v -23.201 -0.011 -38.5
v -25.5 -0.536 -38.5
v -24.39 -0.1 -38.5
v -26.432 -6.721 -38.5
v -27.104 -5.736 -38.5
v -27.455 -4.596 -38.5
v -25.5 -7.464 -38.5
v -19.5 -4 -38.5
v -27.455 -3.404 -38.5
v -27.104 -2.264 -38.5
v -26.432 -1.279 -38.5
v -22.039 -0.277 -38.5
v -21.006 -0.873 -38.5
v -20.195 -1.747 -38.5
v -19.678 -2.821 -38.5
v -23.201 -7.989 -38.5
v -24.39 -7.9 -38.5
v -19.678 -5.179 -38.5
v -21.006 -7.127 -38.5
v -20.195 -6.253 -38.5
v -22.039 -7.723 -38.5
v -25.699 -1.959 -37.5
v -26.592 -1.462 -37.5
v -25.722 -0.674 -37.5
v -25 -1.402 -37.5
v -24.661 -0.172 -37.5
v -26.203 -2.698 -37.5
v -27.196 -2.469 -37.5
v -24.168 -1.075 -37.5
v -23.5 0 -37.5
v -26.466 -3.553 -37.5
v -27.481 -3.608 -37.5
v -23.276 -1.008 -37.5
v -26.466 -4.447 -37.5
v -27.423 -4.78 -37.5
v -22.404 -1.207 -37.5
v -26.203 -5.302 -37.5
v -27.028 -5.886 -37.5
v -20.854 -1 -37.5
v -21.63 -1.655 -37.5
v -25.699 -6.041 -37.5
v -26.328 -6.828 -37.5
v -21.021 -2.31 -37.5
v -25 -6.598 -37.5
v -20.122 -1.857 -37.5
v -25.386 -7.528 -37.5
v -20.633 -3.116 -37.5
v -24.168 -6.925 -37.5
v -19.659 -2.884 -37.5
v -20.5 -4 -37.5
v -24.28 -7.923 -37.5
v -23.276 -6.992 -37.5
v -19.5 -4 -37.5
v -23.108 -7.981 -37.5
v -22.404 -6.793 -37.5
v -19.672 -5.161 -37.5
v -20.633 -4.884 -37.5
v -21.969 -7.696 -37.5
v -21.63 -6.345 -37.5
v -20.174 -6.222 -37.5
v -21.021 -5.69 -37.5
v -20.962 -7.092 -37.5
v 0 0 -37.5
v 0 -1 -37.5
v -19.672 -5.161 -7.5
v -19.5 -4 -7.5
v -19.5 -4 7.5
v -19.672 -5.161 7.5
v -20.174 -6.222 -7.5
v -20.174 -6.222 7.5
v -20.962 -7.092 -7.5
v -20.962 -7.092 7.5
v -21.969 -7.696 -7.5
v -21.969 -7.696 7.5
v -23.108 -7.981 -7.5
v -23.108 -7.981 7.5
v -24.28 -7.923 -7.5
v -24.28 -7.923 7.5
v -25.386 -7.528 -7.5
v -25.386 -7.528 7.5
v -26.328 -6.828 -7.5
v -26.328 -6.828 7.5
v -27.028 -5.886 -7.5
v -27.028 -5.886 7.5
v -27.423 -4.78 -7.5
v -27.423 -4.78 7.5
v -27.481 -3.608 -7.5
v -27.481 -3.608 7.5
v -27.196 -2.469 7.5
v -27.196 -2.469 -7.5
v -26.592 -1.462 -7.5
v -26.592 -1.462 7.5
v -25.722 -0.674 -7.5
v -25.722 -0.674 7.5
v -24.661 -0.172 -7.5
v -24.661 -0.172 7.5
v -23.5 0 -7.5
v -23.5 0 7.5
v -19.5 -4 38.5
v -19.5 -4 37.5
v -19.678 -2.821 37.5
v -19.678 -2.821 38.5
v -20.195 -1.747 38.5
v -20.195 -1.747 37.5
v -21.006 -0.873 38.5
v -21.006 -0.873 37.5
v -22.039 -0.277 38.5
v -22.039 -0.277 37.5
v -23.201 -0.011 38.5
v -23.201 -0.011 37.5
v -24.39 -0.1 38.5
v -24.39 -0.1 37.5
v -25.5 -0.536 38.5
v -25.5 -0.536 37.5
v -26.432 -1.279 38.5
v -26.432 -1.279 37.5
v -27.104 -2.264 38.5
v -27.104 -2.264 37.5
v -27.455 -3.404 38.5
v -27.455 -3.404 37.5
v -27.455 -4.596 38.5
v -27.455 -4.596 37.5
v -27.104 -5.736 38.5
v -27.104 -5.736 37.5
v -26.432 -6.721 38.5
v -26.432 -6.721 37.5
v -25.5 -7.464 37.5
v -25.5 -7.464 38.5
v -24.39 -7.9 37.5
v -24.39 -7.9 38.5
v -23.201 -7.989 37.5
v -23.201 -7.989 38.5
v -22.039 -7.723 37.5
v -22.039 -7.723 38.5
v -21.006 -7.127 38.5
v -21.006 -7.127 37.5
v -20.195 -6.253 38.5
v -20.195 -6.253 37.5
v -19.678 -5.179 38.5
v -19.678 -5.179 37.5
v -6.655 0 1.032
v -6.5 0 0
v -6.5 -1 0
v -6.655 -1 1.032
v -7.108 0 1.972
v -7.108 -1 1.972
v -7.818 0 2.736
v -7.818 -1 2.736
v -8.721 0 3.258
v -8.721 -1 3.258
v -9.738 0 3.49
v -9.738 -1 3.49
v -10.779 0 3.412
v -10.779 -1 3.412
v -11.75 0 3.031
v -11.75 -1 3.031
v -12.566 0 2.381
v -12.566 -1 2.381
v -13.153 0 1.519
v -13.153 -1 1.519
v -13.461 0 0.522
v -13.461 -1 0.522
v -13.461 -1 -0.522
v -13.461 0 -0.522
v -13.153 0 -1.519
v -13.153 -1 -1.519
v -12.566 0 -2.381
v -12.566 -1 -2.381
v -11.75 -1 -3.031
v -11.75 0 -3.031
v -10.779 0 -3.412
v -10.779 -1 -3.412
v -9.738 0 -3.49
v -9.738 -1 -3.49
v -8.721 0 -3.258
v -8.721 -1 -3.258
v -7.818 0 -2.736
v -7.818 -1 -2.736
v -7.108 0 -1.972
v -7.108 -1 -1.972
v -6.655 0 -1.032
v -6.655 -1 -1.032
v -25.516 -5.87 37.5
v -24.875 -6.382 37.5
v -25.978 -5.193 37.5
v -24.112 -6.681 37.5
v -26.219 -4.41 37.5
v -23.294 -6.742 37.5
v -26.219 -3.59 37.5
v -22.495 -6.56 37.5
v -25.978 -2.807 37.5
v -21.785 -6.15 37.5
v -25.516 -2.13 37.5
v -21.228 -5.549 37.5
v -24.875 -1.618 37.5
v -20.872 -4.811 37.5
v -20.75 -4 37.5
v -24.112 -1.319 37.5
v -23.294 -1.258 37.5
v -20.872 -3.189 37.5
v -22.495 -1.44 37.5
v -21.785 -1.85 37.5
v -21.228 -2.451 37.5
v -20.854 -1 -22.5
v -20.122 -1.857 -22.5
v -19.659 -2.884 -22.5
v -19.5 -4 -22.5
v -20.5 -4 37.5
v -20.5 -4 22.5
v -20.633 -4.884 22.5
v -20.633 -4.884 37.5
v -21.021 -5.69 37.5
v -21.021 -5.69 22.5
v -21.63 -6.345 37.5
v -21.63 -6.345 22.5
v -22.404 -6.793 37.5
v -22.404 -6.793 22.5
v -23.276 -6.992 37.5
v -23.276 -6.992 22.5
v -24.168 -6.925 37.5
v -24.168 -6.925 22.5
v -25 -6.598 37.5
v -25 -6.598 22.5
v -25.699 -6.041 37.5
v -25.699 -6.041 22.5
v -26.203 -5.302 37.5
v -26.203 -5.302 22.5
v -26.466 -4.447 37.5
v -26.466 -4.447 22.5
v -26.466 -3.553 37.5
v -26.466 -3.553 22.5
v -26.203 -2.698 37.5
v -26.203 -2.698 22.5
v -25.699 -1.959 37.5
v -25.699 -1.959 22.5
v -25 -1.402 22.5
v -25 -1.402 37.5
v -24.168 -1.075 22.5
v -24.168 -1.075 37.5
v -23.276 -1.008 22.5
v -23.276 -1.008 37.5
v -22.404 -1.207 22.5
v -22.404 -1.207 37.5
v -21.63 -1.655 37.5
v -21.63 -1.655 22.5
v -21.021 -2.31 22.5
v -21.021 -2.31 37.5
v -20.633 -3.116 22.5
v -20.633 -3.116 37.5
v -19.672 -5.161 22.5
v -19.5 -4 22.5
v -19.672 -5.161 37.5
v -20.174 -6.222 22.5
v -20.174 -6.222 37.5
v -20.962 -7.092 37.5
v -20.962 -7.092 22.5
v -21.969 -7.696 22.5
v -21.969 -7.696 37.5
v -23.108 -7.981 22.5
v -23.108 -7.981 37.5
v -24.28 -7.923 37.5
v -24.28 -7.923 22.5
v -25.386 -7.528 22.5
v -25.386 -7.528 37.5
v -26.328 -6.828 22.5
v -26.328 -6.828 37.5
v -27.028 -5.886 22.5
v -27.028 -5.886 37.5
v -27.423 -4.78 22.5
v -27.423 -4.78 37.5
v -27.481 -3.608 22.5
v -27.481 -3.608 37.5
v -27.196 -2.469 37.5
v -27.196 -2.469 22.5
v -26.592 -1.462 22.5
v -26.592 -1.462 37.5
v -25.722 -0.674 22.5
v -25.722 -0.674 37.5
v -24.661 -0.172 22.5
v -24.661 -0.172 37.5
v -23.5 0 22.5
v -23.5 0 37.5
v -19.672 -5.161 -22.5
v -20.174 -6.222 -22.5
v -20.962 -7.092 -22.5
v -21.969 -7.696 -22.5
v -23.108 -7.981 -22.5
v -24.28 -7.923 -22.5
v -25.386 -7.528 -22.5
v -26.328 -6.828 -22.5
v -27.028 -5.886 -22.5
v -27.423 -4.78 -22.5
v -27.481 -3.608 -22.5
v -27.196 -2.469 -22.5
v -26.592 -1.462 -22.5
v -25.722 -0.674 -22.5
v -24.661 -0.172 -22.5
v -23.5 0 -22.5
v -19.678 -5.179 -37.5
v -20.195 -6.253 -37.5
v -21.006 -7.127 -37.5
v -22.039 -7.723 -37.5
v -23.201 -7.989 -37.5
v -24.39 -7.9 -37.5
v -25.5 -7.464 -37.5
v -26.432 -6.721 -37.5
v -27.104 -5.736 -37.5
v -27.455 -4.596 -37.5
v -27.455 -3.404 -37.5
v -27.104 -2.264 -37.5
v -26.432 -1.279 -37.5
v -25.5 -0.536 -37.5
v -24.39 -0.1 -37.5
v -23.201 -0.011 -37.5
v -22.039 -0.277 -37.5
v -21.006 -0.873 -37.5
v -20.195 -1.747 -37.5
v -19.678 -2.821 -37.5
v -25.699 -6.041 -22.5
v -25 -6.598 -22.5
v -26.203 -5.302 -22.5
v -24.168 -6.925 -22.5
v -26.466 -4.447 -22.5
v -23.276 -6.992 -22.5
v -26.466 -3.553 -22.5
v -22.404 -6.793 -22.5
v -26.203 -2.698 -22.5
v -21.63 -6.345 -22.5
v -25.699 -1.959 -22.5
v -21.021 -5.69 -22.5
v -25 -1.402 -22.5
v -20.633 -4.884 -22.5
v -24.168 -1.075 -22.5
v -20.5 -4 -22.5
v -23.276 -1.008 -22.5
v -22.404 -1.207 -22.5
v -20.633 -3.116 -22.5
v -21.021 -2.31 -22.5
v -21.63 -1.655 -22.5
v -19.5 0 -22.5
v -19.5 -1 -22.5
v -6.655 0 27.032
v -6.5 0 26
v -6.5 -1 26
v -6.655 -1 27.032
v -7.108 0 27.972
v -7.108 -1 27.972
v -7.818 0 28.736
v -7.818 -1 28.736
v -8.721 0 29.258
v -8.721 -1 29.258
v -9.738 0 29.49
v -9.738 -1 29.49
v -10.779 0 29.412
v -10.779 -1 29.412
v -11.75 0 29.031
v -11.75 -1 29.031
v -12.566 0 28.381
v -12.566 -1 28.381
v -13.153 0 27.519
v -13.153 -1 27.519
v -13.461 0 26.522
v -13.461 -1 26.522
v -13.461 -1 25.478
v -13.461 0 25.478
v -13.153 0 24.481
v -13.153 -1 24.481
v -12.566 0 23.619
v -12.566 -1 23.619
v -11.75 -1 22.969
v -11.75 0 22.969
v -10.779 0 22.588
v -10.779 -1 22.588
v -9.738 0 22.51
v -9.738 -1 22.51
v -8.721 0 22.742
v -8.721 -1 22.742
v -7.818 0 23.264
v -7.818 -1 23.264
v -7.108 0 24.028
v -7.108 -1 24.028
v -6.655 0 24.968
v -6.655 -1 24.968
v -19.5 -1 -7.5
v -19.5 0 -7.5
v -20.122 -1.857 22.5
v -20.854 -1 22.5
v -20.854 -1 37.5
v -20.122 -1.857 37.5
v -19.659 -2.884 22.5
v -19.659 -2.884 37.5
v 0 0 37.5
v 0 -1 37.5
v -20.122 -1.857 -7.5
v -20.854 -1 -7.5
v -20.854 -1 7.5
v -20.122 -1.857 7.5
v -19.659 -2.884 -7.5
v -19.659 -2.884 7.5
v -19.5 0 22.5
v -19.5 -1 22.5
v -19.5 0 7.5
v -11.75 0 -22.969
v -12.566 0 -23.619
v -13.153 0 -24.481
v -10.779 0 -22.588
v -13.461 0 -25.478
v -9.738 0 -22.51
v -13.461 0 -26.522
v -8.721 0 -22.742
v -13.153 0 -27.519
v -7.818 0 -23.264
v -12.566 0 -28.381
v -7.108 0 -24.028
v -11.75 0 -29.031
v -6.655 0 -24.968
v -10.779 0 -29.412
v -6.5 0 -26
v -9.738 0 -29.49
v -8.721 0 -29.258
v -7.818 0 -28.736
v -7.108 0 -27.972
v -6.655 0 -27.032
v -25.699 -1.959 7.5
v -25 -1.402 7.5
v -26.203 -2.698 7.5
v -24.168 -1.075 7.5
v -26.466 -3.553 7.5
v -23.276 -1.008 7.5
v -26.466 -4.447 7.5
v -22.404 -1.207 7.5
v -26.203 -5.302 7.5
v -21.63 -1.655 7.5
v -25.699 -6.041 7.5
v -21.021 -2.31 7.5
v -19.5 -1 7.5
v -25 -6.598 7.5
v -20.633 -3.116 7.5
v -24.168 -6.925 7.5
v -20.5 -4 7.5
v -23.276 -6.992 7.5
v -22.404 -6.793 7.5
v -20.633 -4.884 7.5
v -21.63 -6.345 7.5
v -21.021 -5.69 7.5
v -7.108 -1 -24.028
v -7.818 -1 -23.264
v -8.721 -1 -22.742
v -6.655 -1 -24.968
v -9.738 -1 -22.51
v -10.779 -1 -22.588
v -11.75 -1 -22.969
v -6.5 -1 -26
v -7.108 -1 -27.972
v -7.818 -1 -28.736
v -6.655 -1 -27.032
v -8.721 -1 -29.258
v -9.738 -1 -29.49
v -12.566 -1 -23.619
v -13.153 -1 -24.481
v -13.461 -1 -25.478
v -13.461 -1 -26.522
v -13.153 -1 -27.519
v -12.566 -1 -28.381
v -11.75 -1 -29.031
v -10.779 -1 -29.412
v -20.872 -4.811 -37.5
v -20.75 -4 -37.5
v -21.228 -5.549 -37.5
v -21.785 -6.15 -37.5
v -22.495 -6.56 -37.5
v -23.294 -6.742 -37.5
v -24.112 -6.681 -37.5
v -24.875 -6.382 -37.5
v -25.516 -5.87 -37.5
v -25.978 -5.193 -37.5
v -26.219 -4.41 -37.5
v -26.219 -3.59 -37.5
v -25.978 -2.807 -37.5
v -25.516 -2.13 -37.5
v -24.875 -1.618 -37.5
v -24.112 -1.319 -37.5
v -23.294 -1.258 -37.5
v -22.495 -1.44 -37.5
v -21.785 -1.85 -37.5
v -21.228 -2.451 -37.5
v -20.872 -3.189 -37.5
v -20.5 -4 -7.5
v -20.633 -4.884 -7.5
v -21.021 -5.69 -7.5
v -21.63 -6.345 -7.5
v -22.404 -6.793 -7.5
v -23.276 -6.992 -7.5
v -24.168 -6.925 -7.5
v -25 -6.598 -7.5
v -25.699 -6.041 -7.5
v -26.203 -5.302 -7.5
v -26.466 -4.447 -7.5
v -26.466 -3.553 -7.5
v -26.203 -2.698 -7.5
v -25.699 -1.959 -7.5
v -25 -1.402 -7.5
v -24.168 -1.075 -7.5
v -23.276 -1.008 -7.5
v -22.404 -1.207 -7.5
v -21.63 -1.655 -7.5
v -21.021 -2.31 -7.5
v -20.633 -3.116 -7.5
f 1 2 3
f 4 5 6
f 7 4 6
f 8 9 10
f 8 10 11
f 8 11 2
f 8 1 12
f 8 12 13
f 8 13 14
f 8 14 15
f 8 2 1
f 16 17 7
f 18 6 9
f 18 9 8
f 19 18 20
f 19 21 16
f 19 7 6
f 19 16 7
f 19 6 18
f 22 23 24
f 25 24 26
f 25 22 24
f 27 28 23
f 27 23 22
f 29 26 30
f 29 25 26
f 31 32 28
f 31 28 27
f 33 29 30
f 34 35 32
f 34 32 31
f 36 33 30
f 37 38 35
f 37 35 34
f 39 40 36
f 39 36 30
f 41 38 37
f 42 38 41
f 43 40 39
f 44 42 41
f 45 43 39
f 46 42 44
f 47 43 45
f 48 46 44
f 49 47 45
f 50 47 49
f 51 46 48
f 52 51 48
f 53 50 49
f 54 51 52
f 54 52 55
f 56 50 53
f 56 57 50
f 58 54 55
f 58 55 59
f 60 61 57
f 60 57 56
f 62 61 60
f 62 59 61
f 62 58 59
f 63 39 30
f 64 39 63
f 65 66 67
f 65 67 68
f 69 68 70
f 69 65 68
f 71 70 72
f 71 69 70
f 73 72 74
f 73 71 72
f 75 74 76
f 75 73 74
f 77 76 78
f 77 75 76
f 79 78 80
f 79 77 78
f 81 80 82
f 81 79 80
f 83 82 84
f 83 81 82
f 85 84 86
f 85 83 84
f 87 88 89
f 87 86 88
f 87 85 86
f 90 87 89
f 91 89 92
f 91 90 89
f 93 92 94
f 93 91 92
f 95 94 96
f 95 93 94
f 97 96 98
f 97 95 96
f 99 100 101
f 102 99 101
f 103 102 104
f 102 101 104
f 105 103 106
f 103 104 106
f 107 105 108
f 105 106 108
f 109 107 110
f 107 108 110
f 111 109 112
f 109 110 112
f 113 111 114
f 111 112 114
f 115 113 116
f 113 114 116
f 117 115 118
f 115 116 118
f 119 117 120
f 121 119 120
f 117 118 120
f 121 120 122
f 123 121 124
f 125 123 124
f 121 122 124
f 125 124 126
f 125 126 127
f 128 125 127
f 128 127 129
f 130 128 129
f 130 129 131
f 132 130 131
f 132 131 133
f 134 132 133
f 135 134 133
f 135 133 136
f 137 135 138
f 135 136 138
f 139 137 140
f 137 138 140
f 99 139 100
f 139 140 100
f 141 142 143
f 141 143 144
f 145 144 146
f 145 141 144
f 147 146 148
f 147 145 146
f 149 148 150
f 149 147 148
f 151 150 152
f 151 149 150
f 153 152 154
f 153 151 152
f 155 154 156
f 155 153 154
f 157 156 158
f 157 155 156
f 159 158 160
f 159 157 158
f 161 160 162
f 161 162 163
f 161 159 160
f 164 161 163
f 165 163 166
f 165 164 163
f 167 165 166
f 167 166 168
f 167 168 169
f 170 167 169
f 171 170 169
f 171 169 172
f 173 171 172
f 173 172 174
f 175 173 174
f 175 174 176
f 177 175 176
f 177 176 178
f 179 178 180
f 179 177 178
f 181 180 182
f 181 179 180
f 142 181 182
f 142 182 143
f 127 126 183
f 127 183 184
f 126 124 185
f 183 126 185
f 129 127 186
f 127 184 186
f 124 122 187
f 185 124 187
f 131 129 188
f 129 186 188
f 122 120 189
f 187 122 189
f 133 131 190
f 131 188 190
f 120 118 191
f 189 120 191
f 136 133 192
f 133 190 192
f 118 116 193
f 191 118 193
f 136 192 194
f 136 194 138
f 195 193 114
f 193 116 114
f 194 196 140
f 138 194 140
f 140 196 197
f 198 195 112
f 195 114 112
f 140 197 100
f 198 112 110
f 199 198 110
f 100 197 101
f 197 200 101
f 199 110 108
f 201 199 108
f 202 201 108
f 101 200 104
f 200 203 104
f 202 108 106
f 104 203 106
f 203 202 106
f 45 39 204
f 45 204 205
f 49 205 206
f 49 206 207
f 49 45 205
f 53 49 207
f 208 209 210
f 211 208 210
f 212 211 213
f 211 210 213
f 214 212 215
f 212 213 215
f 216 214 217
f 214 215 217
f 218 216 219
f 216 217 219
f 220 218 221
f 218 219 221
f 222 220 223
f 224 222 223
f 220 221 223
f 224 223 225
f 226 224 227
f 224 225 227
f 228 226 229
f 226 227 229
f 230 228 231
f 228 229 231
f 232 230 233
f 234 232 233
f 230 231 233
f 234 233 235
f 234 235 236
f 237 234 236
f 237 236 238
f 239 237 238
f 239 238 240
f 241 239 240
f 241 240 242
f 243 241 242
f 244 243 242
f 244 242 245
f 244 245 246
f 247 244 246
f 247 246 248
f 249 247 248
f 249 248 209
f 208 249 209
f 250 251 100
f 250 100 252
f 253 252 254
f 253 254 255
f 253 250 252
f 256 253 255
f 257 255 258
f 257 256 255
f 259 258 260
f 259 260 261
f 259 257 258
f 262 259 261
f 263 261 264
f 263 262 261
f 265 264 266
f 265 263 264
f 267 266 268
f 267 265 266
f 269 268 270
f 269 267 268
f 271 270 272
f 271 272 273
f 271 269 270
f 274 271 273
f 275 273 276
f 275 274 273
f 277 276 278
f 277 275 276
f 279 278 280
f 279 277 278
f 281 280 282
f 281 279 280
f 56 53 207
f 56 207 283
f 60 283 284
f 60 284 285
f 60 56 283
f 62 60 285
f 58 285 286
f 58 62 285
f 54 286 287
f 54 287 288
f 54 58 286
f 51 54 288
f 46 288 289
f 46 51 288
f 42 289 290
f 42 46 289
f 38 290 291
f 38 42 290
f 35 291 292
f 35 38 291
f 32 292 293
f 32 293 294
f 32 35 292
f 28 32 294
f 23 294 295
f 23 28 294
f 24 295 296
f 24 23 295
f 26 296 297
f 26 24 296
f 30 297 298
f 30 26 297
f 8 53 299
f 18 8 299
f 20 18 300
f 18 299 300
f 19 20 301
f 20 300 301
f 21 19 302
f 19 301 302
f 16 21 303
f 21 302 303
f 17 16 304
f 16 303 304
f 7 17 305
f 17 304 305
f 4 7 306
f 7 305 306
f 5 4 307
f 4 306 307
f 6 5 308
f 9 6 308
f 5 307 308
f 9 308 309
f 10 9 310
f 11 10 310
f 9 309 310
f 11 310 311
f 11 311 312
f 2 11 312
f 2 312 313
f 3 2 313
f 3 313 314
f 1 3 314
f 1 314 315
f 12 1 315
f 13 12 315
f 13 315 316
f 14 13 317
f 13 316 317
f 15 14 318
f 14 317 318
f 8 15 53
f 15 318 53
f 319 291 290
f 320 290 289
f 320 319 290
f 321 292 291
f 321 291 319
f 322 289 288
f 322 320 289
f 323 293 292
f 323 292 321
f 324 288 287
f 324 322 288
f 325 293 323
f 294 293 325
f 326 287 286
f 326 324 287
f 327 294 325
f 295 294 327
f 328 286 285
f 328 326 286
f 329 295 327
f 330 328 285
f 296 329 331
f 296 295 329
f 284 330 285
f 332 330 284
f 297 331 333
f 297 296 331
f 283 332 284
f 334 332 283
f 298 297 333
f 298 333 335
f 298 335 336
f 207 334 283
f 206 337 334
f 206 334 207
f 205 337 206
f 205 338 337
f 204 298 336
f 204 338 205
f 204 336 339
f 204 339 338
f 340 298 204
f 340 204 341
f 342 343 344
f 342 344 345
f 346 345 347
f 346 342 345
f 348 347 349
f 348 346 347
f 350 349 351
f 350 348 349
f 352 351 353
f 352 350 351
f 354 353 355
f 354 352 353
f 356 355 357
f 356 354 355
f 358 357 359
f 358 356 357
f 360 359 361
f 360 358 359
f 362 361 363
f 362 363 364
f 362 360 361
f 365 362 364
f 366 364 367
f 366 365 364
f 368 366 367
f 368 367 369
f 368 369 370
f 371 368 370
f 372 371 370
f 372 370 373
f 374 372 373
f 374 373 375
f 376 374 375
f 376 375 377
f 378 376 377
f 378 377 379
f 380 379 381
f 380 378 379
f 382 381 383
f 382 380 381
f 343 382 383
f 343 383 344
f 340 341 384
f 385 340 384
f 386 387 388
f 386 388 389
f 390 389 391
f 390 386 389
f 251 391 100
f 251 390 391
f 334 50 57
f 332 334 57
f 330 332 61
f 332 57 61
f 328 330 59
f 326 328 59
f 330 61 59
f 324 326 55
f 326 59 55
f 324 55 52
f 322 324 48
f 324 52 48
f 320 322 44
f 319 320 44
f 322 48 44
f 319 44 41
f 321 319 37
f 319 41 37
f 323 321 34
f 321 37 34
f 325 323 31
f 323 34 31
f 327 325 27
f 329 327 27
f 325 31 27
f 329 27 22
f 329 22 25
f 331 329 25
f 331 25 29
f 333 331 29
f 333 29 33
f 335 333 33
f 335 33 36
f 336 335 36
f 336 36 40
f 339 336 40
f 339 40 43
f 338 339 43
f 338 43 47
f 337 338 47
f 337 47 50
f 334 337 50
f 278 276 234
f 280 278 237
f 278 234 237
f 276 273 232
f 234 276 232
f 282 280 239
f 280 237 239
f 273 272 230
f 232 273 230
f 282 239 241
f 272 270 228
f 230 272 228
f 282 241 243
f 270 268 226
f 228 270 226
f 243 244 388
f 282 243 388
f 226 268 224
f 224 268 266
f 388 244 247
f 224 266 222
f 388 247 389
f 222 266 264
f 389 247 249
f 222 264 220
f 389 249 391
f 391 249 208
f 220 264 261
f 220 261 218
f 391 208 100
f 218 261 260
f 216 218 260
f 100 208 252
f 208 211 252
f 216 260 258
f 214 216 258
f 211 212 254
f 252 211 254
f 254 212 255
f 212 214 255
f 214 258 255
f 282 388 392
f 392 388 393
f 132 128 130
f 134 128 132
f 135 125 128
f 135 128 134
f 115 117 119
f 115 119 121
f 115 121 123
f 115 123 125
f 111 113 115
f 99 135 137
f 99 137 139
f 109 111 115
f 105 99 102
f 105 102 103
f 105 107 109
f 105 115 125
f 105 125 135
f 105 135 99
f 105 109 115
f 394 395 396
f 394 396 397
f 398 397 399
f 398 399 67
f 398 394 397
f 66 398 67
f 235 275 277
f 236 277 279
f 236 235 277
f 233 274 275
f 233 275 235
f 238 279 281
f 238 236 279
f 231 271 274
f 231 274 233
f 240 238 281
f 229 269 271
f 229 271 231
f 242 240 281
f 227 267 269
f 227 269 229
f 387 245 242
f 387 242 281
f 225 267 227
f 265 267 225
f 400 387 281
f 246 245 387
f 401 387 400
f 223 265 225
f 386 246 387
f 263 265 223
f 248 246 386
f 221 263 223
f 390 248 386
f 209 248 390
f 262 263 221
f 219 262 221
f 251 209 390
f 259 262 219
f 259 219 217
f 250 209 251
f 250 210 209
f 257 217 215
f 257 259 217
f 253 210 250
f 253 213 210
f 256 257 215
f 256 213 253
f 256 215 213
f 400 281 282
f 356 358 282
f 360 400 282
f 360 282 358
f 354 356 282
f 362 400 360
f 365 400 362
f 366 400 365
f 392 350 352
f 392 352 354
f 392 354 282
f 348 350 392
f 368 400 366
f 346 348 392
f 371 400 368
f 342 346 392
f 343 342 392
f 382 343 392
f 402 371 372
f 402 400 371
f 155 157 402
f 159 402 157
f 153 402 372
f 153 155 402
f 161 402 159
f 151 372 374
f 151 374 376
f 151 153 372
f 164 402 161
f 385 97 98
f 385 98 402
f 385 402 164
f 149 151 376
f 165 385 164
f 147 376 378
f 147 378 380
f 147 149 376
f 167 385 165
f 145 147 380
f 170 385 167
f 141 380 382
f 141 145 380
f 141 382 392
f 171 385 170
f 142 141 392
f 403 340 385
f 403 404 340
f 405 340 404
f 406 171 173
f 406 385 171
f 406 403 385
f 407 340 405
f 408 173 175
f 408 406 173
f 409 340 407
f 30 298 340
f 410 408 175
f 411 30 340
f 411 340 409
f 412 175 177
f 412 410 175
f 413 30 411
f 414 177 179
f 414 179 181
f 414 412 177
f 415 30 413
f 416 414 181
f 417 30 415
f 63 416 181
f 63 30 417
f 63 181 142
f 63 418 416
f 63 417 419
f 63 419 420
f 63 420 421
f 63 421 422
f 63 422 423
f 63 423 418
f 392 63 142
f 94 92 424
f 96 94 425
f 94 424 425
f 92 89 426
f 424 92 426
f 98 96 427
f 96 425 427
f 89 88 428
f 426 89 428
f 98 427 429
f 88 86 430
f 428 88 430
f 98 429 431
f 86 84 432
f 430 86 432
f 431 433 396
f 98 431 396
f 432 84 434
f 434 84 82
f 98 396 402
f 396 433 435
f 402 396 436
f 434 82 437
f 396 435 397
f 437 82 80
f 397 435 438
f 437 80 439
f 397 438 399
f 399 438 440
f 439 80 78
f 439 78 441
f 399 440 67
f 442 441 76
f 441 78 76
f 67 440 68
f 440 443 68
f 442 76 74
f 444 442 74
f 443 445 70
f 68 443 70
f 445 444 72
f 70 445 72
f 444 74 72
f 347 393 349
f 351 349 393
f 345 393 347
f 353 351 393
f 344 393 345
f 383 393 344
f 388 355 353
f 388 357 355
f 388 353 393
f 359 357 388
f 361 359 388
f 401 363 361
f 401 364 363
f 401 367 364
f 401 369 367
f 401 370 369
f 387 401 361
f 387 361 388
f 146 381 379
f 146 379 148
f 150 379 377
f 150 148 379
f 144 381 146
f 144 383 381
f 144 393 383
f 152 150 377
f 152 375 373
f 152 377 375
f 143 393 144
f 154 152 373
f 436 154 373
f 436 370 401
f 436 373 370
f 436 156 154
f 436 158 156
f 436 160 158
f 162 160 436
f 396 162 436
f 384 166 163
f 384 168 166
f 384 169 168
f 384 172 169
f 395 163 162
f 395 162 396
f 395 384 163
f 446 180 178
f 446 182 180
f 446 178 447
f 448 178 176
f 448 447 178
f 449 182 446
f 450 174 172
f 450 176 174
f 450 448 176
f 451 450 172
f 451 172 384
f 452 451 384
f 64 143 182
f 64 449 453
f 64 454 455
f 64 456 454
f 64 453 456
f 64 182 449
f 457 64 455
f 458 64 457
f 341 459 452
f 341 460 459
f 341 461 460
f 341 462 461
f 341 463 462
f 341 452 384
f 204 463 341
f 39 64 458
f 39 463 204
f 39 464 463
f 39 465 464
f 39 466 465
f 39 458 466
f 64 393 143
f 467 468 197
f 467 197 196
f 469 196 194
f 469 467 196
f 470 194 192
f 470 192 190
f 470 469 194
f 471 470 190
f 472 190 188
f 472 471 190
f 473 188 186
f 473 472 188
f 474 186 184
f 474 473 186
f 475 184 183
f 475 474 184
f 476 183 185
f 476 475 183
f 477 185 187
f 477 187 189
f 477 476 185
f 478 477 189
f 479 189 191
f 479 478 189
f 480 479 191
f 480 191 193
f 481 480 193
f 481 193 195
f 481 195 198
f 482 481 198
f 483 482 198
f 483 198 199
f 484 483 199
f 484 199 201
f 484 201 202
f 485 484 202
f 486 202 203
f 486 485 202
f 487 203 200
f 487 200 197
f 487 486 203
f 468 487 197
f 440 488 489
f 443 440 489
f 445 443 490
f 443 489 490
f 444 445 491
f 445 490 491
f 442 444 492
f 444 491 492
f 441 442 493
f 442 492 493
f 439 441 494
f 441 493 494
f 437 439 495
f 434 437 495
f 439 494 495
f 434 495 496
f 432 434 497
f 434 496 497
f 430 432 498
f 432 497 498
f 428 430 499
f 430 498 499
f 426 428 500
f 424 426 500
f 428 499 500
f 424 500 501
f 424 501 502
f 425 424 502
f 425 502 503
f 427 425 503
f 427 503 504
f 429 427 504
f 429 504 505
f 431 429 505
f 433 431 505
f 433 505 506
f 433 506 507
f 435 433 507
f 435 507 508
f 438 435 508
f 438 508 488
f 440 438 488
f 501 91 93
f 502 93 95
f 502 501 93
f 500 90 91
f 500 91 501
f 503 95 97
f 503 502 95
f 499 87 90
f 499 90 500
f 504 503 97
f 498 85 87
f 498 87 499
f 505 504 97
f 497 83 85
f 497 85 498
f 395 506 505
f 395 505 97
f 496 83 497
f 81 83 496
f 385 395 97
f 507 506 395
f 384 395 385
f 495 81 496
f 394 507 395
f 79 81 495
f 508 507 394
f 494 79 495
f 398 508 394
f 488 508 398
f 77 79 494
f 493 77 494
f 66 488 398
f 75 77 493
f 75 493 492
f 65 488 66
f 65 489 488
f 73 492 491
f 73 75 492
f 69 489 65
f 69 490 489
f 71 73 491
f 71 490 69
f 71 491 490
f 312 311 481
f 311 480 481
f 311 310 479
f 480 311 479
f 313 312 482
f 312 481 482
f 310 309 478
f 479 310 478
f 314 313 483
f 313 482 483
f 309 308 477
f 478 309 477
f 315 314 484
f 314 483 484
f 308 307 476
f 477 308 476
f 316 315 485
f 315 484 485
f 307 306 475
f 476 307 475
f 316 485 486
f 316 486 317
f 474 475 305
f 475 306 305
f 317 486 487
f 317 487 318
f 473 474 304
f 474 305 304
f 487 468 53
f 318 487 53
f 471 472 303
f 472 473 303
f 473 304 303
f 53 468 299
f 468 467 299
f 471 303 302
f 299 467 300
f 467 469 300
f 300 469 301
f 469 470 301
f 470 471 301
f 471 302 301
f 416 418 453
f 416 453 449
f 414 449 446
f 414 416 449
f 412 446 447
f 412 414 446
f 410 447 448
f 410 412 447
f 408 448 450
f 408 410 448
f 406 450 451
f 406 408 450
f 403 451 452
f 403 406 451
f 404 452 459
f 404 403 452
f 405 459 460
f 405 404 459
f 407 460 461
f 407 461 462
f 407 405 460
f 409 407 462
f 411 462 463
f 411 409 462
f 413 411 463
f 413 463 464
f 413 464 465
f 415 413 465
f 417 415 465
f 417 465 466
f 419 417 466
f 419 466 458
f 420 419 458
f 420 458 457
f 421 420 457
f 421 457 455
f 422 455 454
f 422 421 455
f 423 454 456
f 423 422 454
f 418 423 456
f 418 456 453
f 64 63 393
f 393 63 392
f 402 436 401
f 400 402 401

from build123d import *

# Parameters (mm, degrees)
F0_W          = 20
F0_H          = 75
F0_R          = 3.5
F1_DEPTH      = 1
F2_R          = 3
F3_DEPTH      = 75
F4_W          = 8
F4_H          = 15
F5_DEPTH      = 1.001
F5_DEPTH_BACK = 7.001
F6_R          = 2.75
F7_DEPTH      = 75
F8_R          = 4
F9_DEPTH      = 1
F10_R         = 4
F11_DEPTH     = 1


with BuildPart() as f1:
    # F0 (on Front) → F1 (new body)
    with BuildSketch(Plane.XZ):
        with Locations((-10, 0)):
            Rectangle(F0_W, F0_H)
        with Locations((-10, -26)):
            Circle(F0_R, mode=Mode.SUBTRACT)
        with Locations((-10, 0)):
            Circle(F0_R, mode=Mode.SUBTRACT)
        with Locations((-10, 26)):
            Circle(F0_R, mode=Mode.SUBTRACT)
    extrude(amount=F1_DEPTH)

    # F2 (on face) → F3 (join, through all)
    with BuildSketch(Plane(origin=(0, 0, -37.5), x_dir=(1, 0, 0), z_dir=(0, 0, -1))):
        with BuildLine():
            ThreePointArc((-20.8542486889, 1), (-19.8542486889, 2.3542486889), (-19.5, 4))
            ThreePointArc((-19.5, 4), (-26.3284271247, 6.8284271247), (-23.5, 0))
            ThreePointArc((-23.5, 0), (-22.0857864376, 0.2583426132), (-20.8542486889, 1))
        make_face()
        with Locations((-23.5, 4)):
            Circle(F2_R, mode=Mode.SUBTRACT)
        with BuildLine():
            ThreePointArc((-20.8542486889, 1), (-22.0857864376, 0.2583426132), (-23.5, 0))
            Line((-23.5, 0), (-20, 0))
            Line((-20, 0), (-20, 1))
            Line((-20, 1), (-20.8542486889, 1))
        make_face()
    extrude(amount=-F3_DEPTH)

    # F4 (on face) → F5 (cut, two sides)
    with BuildSketch(Plane.XZ.offset(1)) as f5_sk:
        with Locations((-23.5, -15)):
            Rectangle(F4_W, F4_H)
        with Locations((-23.5, 15)):
            Rectangle(F4_W, F4_H)
    extrude(amount=-F5_DEPTH, mode=Mode.SUBTRACT)
    extrude(f5_sk.sketch, amount=F5_DEPTH_BACK, mode=Mode.SUBTRACT)


with BuildPart() as f7:
    # F6 (on face) → F7 (new body, through all)
    with BuildSketch(Plane(origin=(0, 0, -37.5), x_dir=(1, 0, 0), z_dir=(0, 0, -1))):
        with Locations((-23.5, 4)):
            Circle(F6_R)
    extrude(amount=-F7_DEPTH)

    # F8 (on face) → F9 (join)
    with BuildSketch(Plane.XY.offset(37.5)):
        with Locations((-23.5, -4)):
            Circle(F8_R)
    extrude(amount=F9_DEPTH)

    # F10 (on face) → F11 (join)
    with BuildSketch(Plane(origin=(0, 0, -37.5), x_dir=(1, 0, 0), z_dir=(0, 0, -1))):
        with Locations((-23.5, 4)):
            Circle(F10_R)
    extrude(amount=F11_DEPTH)


solid = Compound([f1.part, f7.part])
